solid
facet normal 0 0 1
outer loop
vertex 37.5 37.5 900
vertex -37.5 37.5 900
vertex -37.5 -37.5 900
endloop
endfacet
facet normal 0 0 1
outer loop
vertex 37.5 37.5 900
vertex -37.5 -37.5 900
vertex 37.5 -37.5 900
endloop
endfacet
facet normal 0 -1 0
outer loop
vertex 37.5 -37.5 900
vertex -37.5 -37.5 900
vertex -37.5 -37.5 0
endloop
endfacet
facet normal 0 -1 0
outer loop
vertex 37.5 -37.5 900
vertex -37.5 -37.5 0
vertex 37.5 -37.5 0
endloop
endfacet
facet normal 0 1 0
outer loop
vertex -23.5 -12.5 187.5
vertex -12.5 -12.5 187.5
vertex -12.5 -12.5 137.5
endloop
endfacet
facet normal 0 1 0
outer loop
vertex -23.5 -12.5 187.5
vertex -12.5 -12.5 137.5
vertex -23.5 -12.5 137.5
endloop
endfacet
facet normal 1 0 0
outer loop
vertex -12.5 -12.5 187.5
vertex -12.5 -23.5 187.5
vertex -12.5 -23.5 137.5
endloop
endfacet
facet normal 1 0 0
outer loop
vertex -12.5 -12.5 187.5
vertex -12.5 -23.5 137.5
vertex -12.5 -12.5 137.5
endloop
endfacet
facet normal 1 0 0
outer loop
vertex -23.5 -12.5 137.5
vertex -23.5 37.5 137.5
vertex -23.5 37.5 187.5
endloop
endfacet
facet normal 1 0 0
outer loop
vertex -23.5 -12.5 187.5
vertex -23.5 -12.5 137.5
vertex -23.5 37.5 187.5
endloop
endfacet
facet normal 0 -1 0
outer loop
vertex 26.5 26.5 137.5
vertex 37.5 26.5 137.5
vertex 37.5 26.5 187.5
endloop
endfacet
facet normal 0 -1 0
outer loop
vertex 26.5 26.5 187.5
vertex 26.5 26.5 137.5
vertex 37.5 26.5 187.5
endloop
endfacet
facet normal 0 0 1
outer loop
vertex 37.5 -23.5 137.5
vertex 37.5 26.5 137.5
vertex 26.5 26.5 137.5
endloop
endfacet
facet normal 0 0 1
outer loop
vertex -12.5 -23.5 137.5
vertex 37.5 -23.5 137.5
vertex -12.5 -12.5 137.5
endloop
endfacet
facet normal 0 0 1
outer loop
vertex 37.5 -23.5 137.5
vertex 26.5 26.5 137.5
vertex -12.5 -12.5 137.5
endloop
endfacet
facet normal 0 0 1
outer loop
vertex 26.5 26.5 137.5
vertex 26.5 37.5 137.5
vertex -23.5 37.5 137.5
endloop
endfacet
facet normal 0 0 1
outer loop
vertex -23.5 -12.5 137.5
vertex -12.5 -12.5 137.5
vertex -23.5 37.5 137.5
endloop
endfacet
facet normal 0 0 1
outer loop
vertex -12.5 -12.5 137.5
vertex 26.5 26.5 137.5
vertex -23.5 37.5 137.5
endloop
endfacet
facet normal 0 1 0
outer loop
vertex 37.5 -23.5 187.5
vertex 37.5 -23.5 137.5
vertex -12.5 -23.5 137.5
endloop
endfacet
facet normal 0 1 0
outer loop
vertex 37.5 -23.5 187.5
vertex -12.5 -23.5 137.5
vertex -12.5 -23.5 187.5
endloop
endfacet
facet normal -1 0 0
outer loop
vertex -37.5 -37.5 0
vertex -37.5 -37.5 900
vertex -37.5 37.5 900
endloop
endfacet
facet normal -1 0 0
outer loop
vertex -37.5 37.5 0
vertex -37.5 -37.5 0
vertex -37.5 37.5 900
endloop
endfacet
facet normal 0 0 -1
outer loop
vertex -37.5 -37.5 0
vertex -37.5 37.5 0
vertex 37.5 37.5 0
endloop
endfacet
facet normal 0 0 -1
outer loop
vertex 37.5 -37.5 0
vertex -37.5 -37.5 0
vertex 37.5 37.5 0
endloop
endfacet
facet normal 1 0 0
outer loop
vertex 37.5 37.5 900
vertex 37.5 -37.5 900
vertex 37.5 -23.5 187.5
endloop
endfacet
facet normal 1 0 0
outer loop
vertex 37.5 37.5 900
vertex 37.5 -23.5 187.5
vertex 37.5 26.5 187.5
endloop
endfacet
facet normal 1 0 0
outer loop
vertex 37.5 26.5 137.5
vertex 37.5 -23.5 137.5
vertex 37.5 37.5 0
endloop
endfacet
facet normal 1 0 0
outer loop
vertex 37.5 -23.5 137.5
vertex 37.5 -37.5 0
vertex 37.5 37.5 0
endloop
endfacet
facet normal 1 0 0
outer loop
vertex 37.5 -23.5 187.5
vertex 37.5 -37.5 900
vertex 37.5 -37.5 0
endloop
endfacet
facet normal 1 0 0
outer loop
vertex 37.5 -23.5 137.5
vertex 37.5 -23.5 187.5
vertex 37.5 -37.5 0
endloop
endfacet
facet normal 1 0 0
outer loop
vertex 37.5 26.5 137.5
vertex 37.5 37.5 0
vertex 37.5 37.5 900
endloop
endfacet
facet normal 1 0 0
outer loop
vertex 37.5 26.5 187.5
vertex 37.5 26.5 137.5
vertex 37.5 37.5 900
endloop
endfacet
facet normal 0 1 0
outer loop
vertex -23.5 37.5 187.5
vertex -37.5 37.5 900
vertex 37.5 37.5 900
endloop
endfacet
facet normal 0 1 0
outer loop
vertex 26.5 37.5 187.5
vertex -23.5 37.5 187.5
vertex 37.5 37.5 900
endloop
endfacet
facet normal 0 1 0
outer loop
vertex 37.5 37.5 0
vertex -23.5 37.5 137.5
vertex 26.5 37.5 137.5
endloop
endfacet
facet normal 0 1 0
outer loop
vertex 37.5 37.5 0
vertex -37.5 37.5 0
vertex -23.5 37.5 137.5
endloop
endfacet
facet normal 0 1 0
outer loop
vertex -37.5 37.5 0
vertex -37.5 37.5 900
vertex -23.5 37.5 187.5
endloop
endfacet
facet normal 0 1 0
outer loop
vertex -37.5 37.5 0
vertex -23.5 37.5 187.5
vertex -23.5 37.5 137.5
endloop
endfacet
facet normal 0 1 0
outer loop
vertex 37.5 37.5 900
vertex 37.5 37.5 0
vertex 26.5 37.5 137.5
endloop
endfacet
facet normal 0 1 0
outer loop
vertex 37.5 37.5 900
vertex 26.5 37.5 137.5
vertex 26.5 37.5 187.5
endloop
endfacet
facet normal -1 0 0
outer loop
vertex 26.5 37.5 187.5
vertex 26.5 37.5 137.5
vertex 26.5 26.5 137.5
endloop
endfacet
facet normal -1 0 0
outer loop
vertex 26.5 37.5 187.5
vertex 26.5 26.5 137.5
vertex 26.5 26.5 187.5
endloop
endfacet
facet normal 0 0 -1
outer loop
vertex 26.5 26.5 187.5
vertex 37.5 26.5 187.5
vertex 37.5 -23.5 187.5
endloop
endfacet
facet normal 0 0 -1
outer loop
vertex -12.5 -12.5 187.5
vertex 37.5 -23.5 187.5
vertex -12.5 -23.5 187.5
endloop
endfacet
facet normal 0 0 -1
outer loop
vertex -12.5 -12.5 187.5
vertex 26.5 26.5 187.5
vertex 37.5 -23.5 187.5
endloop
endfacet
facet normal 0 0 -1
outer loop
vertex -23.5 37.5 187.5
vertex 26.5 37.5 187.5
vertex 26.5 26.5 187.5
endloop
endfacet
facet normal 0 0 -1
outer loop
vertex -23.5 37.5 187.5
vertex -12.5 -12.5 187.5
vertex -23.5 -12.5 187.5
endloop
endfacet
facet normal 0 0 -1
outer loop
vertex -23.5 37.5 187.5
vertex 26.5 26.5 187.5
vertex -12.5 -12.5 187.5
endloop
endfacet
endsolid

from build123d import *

# Parameters (mm, degrees)
F0_W     = 75
F0_H     = 75
F1_DEPTH = 900
F2_W     = 50
F2_H     = 50
F3_DEPTH = 50
F5_W     = 50
F5_H     = 50
F6_DEPTH = 50


with BuildPart() as f1:
    # F0 (on Top) → F1 (new body)
    with BuildSketch(Plane.XY):
        Rectangle(F0_W, F0_H)
    extrude(amount=F1_DEPTH)

    # F2 (on face) → F3 (cut)
    with BuildSketch(Plane.YZ.offset(37.5)):
        with Locations((1.5, 162.5)):
            Rectangle(F2_W, F2_H)
    extrude(amount=-F3_DEPTH, mode=Mode.SUBTRACT)

    # F5 (on face) → F6 (cut)
    with BuildSketch(Plane(origin=(0, 37.5, 0), x_dir=(-1, 0, 0), z_dir=(0, 1, 0))):
        with Locations((-1.5, 162.5)):
            Rectangle(F5_W, F5_H)
    extrude(amount=-F6_DEPTH, mode=Mode.SUBTRACT)


solid = f1.part
